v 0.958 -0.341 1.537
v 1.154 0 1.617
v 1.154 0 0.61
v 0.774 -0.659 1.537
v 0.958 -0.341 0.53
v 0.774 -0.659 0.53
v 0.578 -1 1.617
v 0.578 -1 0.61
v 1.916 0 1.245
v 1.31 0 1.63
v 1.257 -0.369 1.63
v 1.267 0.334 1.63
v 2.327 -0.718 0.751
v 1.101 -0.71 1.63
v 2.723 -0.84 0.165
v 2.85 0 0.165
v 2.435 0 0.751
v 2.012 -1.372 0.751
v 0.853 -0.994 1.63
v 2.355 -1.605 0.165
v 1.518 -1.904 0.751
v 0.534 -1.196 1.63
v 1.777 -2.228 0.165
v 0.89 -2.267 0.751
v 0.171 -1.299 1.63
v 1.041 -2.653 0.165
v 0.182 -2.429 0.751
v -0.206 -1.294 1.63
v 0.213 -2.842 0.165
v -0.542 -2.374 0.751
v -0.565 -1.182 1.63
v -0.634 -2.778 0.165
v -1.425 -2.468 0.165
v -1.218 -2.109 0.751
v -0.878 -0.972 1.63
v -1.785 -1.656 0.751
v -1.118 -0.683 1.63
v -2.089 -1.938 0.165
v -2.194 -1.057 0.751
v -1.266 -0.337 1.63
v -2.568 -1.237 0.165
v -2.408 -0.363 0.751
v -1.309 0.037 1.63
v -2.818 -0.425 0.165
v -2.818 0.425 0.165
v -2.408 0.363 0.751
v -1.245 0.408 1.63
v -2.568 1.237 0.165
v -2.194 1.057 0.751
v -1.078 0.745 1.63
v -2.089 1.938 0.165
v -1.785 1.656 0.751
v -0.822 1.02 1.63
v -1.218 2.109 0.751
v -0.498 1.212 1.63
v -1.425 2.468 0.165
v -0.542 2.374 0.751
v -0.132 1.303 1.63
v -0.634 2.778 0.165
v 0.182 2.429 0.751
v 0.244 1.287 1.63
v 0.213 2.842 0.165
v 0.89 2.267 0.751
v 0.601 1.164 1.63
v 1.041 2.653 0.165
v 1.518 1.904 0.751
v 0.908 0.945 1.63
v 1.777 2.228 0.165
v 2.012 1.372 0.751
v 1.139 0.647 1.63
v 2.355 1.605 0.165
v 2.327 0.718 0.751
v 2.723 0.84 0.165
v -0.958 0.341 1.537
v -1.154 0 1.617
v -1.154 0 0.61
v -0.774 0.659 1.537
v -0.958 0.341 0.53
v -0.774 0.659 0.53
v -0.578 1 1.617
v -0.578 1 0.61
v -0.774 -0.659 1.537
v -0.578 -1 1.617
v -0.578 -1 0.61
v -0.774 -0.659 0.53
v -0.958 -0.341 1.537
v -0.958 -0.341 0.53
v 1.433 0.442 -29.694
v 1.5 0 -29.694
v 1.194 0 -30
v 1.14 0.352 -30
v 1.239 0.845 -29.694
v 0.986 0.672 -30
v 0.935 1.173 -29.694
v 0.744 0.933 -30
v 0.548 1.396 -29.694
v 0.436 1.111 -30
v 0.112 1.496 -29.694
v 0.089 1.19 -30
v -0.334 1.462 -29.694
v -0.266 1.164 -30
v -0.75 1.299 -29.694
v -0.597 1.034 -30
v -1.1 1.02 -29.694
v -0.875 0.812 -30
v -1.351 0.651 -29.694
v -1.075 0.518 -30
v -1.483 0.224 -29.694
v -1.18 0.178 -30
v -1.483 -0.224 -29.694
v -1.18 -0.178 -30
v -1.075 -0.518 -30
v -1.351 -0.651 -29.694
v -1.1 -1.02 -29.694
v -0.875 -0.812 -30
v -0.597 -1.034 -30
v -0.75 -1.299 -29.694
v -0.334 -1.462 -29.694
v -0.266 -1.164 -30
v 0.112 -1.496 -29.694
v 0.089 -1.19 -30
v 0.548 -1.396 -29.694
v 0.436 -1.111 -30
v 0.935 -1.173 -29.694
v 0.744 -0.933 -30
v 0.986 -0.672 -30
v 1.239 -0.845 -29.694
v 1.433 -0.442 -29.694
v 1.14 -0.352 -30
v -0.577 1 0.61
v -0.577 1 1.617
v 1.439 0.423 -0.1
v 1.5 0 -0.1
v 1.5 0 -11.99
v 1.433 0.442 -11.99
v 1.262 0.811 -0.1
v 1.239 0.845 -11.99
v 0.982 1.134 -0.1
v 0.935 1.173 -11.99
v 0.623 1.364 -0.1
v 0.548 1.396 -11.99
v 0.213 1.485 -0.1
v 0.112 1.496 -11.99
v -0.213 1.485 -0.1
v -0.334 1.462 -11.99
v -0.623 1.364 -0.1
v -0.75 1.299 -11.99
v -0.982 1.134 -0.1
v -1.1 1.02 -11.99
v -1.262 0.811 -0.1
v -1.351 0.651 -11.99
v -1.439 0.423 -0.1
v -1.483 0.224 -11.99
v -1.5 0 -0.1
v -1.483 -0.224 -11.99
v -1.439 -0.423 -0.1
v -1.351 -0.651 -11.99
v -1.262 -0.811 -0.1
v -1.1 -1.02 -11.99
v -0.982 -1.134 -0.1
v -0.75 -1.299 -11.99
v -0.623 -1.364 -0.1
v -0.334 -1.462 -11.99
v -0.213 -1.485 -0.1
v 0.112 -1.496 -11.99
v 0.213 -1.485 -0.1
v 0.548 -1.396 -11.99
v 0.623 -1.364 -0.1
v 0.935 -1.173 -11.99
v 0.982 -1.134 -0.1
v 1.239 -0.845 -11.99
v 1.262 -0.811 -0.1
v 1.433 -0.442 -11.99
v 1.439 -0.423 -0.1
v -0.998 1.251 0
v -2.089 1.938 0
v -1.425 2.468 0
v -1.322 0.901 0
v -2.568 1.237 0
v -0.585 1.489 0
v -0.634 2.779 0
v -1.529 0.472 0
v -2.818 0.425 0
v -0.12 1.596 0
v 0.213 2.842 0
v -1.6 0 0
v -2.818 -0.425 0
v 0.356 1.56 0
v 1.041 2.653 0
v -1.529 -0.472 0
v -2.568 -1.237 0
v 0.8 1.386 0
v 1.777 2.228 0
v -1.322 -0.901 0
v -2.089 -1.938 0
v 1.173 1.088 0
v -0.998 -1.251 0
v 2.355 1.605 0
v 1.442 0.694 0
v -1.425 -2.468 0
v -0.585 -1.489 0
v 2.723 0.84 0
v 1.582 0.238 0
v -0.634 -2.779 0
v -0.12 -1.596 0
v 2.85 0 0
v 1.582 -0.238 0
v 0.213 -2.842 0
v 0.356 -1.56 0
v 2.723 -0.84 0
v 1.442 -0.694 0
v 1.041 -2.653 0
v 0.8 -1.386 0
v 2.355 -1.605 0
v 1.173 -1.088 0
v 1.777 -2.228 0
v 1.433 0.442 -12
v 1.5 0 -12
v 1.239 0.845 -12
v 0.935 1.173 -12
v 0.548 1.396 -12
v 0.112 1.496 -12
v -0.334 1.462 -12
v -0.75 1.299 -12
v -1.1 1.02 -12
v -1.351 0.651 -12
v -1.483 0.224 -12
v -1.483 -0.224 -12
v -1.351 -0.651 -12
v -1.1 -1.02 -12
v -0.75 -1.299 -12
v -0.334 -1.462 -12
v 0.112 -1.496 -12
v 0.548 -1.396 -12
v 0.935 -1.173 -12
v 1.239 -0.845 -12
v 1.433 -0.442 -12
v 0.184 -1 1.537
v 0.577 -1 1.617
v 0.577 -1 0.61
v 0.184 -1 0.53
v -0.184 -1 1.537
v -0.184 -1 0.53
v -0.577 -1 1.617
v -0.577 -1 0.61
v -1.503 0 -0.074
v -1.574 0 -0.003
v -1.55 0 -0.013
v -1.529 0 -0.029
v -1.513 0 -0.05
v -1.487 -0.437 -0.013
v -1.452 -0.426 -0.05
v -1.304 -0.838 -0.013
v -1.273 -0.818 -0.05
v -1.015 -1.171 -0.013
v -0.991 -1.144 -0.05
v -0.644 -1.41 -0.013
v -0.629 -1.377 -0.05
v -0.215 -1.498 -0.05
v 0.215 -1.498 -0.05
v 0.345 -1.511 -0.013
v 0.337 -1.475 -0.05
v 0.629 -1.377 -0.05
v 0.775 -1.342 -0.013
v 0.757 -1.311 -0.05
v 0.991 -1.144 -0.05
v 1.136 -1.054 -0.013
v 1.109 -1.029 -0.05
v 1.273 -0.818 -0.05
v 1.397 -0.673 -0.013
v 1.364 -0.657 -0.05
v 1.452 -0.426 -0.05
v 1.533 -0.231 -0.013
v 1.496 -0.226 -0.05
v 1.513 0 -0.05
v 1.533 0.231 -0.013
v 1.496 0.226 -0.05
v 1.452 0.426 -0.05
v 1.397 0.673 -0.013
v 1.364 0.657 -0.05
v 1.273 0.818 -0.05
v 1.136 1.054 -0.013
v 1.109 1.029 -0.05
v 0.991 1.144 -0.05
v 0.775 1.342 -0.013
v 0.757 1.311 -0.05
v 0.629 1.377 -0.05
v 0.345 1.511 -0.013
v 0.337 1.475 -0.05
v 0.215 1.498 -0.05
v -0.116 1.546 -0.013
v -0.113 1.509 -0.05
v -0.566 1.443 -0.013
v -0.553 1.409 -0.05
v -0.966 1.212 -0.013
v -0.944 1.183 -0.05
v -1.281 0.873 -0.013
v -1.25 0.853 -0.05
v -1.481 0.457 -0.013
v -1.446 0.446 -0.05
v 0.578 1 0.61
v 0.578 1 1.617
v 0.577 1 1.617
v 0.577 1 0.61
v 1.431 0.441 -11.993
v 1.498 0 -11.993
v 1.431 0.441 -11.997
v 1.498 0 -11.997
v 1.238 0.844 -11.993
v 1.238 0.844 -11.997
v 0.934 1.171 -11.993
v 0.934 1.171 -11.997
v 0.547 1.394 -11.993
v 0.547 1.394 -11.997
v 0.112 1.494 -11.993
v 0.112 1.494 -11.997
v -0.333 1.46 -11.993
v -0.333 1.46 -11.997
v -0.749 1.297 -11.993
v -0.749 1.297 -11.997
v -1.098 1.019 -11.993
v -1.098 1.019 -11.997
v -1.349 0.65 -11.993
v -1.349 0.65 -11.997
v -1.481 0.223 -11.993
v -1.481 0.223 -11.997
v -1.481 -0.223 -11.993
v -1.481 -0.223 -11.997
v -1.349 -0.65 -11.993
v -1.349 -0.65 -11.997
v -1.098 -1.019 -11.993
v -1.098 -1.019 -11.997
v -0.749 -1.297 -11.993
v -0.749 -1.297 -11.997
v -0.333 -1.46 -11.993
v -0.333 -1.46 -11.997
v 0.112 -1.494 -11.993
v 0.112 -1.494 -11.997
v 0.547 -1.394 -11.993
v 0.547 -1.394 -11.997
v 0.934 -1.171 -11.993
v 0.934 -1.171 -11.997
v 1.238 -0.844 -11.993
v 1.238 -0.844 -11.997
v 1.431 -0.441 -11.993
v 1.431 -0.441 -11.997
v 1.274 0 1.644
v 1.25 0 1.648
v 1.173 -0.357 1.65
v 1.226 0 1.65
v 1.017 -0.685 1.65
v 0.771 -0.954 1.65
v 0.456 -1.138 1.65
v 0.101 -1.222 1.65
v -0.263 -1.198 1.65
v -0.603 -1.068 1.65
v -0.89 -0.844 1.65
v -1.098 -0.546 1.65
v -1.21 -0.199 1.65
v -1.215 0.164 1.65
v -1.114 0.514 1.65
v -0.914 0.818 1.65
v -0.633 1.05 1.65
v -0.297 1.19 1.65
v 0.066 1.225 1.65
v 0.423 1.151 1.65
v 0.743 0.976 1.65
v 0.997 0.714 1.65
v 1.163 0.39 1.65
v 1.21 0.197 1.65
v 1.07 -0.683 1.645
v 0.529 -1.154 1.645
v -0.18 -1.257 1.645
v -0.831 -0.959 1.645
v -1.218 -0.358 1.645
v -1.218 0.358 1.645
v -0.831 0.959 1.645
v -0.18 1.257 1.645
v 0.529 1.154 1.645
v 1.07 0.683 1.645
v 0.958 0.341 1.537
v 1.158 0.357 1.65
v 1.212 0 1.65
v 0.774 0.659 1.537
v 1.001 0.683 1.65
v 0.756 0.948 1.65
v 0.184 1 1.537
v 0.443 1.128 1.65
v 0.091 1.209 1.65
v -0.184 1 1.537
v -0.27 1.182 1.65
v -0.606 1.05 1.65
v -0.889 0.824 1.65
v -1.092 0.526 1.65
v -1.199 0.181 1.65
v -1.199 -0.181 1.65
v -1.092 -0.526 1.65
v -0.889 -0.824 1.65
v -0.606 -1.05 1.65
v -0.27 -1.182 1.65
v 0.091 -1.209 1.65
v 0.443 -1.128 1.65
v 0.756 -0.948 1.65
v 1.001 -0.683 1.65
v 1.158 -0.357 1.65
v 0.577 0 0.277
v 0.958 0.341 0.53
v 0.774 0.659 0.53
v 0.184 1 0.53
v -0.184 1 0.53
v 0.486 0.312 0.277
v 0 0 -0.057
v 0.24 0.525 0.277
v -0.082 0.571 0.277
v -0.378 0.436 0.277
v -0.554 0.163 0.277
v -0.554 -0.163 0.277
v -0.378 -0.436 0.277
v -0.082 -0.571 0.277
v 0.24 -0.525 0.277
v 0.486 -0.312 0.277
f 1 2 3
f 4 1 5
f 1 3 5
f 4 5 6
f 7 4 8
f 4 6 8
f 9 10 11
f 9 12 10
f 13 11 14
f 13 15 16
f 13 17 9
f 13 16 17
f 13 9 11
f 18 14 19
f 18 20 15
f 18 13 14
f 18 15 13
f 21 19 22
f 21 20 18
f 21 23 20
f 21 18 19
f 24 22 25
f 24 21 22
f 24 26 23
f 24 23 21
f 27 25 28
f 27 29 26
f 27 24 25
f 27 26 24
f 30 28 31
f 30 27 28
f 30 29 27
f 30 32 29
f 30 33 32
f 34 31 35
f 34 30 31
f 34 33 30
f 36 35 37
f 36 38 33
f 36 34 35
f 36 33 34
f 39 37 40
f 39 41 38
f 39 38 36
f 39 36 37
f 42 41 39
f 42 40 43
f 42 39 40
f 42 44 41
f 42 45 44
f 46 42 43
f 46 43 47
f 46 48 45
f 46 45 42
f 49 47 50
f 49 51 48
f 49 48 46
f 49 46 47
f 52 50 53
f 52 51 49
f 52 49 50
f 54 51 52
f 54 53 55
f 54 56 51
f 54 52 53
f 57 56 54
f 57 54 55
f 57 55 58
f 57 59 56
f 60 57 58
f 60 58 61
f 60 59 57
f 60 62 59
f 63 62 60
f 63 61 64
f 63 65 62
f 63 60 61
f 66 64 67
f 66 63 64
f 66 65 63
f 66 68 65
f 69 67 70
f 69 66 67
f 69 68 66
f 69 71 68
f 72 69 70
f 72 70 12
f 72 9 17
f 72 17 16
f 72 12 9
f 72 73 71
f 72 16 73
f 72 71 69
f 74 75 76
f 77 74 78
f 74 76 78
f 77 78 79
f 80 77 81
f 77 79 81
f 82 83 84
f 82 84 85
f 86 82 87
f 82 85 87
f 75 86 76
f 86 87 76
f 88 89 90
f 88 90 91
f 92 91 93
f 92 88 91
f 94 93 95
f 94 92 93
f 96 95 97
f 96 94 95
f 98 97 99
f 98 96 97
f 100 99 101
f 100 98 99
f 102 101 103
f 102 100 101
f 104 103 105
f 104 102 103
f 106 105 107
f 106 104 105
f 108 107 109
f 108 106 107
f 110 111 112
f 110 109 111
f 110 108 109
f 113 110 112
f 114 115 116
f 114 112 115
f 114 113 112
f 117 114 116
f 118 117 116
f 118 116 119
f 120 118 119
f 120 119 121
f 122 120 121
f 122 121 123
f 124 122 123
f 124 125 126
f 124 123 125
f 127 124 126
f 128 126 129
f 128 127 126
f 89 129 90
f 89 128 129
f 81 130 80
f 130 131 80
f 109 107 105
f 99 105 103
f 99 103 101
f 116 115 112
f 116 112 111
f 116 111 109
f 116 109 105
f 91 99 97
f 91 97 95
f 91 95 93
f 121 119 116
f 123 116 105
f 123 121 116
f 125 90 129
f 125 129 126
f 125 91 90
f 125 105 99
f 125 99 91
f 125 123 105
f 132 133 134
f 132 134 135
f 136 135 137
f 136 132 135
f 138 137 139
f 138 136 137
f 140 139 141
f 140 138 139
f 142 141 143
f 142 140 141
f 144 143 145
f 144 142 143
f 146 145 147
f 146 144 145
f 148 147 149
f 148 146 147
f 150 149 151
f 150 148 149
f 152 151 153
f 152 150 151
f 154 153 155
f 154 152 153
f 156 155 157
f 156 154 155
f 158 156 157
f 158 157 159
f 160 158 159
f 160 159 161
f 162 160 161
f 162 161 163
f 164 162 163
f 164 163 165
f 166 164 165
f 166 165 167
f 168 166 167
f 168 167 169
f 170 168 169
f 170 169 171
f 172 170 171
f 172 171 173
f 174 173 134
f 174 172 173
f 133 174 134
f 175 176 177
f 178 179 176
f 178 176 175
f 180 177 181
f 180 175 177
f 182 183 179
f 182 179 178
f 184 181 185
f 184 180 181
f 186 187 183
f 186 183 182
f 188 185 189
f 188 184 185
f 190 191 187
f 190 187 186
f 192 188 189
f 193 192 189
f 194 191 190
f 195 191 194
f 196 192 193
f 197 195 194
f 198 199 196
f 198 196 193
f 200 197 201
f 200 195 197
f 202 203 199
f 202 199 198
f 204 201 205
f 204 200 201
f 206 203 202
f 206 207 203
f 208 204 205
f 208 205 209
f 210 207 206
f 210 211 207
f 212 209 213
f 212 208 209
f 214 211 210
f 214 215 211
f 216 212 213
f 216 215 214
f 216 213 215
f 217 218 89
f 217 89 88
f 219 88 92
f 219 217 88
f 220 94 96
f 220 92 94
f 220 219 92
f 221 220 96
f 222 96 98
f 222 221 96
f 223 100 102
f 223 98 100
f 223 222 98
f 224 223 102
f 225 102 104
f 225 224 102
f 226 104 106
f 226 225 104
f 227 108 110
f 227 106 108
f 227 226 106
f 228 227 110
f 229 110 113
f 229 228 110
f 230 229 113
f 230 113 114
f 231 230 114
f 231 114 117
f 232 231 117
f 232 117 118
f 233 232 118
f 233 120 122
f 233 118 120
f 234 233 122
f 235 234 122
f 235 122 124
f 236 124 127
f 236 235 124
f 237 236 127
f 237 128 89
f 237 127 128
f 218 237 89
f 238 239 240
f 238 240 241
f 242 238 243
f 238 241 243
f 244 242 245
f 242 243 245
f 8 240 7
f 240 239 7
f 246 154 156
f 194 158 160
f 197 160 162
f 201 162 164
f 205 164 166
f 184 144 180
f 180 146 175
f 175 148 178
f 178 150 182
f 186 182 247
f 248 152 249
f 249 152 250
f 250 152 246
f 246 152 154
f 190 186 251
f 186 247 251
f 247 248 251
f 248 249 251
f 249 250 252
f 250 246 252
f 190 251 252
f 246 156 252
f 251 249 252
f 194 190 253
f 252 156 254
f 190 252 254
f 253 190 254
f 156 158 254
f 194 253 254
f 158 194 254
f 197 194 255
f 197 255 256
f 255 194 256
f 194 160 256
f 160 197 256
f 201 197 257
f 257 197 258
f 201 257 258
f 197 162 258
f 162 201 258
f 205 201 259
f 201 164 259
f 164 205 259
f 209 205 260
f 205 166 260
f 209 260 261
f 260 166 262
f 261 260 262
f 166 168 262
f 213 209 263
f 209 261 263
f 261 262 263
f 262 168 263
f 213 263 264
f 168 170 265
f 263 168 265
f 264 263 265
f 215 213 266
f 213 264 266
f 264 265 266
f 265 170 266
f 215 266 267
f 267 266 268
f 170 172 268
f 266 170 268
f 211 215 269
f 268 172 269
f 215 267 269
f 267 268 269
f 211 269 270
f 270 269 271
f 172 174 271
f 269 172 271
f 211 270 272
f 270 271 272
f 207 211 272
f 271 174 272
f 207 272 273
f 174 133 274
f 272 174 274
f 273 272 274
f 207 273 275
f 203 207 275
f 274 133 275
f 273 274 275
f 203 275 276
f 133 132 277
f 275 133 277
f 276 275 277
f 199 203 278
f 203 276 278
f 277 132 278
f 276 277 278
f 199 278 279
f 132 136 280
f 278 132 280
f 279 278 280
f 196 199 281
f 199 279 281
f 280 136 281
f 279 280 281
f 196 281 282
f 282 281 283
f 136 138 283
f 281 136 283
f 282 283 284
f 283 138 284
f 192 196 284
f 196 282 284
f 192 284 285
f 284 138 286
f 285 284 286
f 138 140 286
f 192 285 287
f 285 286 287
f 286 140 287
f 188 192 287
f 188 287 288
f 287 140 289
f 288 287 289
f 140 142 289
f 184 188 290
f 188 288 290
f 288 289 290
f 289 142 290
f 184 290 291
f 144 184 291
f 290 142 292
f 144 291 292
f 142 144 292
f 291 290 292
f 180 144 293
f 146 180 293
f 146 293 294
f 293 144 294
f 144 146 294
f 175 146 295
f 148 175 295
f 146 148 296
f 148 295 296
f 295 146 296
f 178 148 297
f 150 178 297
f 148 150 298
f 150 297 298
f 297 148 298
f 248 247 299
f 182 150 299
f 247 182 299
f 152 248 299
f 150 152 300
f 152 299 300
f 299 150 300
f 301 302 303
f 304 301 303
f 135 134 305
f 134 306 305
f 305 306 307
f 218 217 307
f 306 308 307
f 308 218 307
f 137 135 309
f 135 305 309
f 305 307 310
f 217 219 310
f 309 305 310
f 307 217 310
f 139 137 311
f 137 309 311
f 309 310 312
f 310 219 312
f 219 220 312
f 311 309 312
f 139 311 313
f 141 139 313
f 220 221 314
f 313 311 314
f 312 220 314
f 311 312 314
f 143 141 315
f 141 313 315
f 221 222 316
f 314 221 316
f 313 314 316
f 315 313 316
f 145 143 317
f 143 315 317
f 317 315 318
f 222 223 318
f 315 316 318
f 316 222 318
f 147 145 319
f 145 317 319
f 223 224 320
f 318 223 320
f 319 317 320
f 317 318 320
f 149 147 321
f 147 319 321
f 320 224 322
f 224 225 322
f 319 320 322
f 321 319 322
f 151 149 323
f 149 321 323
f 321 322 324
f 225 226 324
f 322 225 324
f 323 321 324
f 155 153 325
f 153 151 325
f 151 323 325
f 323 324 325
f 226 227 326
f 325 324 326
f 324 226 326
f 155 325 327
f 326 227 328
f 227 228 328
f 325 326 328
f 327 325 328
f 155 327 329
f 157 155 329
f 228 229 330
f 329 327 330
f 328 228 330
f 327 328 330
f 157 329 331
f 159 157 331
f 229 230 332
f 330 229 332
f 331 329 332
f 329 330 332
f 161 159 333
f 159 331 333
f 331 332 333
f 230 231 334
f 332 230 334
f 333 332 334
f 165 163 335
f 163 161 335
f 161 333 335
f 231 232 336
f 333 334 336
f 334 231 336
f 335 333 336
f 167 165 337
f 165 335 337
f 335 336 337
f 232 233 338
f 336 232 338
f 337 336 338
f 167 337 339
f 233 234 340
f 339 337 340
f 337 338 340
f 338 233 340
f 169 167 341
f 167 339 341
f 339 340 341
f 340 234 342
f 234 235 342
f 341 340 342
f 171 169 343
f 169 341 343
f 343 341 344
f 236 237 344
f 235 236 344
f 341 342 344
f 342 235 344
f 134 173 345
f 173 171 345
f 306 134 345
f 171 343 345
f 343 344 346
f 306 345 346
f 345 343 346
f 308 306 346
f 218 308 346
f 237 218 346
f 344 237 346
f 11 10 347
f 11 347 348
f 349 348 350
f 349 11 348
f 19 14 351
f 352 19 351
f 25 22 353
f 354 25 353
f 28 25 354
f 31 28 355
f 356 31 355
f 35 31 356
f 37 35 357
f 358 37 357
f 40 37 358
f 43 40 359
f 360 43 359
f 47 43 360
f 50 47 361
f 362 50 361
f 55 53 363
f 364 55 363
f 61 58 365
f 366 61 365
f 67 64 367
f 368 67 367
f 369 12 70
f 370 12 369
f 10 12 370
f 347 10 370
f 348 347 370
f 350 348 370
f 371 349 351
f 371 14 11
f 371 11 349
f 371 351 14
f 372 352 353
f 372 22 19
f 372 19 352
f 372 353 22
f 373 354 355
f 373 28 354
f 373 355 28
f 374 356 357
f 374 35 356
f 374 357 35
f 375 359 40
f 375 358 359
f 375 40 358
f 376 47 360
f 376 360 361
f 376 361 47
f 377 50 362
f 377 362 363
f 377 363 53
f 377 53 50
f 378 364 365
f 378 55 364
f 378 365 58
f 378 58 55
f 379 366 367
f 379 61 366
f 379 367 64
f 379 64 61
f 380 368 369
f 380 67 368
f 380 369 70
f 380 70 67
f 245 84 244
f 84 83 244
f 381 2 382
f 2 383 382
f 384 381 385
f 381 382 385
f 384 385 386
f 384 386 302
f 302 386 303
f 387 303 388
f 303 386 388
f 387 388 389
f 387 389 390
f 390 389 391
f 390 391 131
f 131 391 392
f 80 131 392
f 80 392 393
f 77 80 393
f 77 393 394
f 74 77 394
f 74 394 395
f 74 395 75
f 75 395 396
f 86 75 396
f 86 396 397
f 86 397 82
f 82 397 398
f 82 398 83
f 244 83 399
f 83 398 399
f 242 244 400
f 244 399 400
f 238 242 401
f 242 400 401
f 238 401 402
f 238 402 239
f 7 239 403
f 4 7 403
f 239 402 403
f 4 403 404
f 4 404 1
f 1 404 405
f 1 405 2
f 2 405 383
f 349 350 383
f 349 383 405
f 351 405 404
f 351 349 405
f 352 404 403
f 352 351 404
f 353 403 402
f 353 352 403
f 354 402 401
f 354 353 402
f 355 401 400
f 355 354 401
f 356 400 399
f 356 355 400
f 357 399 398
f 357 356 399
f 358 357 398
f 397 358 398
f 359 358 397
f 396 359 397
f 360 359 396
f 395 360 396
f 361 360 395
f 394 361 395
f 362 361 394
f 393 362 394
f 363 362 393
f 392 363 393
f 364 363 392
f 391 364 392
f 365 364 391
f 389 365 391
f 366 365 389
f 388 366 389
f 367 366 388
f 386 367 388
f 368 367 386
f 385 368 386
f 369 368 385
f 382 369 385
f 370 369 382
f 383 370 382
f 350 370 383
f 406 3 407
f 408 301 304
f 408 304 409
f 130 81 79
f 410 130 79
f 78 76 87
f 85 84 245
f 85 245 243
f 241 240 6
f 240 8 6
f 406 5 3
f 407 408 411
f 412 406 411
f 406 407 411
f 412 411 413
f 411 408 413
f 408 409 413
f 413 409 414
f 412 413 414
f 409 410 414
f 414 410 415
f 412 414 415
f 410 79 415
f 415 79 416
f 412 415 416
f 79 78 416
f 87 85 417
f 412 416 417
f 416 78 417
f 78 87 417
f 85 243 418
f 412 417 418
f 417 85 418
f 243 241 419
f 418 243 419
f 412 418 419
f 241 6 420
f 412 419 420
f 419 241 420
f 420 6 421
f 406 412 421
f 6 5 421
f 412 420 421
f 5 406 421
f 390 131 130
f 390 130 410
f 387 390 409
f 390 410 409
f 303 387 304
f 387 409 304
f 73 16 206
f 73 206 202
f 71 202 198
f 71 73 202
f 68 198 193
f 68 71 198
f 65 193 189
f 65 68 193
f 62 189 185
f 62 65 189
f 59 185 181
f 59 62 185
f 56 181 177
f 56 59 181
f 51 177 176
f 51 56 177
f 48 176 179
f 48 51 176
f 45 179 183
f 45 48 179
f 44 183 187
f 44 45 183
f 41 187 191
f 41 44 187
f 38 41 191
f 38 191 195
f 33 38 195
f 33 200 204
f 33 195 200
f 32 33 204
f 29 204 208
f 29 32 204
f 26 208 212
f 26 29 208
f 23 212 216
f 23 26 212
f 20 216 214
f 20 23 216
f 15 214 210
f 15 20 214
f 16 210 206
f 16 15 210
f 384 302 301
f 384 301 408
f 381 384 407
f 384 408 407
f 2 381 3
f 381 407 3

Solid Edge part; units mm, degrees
sketch "Sketch1" plane through (0, 0, 0) normal (0, -1, 0) x (1, 0, 0)
  line L0 (0, -30) -> (1.5, -30)
  line L1 (1.5, -30) -> (1.5, -12)
  arc A0 (1.5, -11.99) -> (1.5, -12) centre (1.5038, -11.995) ccw
  line L2 (1.5, -11.99) -> (1.5, 0)
  line L3 (1.5, 0) -> (2.85, 0)
  line L4 (2.85, 0) -> (2.85, 0.165)
  arc A1 (1.27, 1.65) -> (2.85, 0.165) centre (-0.3628, -1.6703) cw
  line L5 (0, 1.65) -> (1.27, 1.65)
  dimension "D1" = 18
  dimension "D2" = 1.5
  dimension "D3" = 1.27
  dimension "D4" = 2.85
  dimension "D5" = 0.165
  dimension "D6" = 1.65
  dimension "D7" = 3.7
  dimension "D8" = 30
  dimension "D9" = 0.01
  dimension "D10" = 0.0025
revolve "RevolvedProtrusion1" add sketch "Sketch1" angle 360 about axis through (0, 0, 5) along (0, 0, -1)
sketch "Sketch2" plane through (0, 0, 0) normal (0, -1, 0) x (1, 0, 0)
  line L0 (0, -0.0566) -> (1.1545, 0.61)
  line L1 (1.1545, 0.61) -> (1.1545, 1.65)
  line L2 (1.1545, 1.65) -> (0, 1.65)
  dimension "D1" = 1.1545
  dimension "D2" = 1.04
revolve "RevolvedCutout1" cut sketch "Sketch2" angle 360 about axis through (0, 0, 5.3) along (0, 0, -1)
sketch "Sketch3" plane through (0, 0, 0) normal (0, 0, -1) x (0, 1, 0)
  arc A0 (-1, 0.577) -> (-1, -0.577) centre (0, 0) ccw
  line L0 (-1, 0.577) -> (-1, -0.577)
  dimension "D1" = 1
extrude "Protrusion1" add sketch "Sketch3" against normal blind 1.65
pattern_circular "Pattern1" count 6 over 360 about axis through (0, 0, 0) along (0, 0, -1) of "Protrusion1"
fillet "Round_1" radius 0.185 1 edges at (-1.27, 0, 1.65)
sketch "Sketch4" plane through (0, 0, 0) normal (0, -1, 0) x (1, 0, 0)
  line L0 (0, 0.9501) -> (1.2122, 1.65)
  line L1 (1.2122, 1.65) -> (0, 1.65)
  dimension "D1" = 1.2122
revolve "RevolvedCutout2" cut sketch "Sketch4" angle 360 about axis through (0, 0, 5.3) along (0, 0, -1)
sketch "Sketch5" plane through (0, 0, 0) normal (0, -1, 0) x (1, 0, 0)
  line L0 (-1.5, 0) -> (-1.5, -0.1)
  line L1 (-1.6, 0) -> (-1.5, 0)
  arc A0 (-1.6, 0) -> (-1.5, -0.1) centre (-1.6, -0.1) cw
  dimension "D1" = 1.5
  dimension "D2" = 0.1
revolve "RevolvedProtrusion2" add sketch "Sketch5" angle 360 about axis through (0, 0, -0.5) along (0, 0, 1)
cosmetic_thread "Thread1" size "M3"
chamfer "Chamfer1" distance 0.3065 angle 45 1 edges at (-1.5, 0, -30)
properties material "Stahl"
